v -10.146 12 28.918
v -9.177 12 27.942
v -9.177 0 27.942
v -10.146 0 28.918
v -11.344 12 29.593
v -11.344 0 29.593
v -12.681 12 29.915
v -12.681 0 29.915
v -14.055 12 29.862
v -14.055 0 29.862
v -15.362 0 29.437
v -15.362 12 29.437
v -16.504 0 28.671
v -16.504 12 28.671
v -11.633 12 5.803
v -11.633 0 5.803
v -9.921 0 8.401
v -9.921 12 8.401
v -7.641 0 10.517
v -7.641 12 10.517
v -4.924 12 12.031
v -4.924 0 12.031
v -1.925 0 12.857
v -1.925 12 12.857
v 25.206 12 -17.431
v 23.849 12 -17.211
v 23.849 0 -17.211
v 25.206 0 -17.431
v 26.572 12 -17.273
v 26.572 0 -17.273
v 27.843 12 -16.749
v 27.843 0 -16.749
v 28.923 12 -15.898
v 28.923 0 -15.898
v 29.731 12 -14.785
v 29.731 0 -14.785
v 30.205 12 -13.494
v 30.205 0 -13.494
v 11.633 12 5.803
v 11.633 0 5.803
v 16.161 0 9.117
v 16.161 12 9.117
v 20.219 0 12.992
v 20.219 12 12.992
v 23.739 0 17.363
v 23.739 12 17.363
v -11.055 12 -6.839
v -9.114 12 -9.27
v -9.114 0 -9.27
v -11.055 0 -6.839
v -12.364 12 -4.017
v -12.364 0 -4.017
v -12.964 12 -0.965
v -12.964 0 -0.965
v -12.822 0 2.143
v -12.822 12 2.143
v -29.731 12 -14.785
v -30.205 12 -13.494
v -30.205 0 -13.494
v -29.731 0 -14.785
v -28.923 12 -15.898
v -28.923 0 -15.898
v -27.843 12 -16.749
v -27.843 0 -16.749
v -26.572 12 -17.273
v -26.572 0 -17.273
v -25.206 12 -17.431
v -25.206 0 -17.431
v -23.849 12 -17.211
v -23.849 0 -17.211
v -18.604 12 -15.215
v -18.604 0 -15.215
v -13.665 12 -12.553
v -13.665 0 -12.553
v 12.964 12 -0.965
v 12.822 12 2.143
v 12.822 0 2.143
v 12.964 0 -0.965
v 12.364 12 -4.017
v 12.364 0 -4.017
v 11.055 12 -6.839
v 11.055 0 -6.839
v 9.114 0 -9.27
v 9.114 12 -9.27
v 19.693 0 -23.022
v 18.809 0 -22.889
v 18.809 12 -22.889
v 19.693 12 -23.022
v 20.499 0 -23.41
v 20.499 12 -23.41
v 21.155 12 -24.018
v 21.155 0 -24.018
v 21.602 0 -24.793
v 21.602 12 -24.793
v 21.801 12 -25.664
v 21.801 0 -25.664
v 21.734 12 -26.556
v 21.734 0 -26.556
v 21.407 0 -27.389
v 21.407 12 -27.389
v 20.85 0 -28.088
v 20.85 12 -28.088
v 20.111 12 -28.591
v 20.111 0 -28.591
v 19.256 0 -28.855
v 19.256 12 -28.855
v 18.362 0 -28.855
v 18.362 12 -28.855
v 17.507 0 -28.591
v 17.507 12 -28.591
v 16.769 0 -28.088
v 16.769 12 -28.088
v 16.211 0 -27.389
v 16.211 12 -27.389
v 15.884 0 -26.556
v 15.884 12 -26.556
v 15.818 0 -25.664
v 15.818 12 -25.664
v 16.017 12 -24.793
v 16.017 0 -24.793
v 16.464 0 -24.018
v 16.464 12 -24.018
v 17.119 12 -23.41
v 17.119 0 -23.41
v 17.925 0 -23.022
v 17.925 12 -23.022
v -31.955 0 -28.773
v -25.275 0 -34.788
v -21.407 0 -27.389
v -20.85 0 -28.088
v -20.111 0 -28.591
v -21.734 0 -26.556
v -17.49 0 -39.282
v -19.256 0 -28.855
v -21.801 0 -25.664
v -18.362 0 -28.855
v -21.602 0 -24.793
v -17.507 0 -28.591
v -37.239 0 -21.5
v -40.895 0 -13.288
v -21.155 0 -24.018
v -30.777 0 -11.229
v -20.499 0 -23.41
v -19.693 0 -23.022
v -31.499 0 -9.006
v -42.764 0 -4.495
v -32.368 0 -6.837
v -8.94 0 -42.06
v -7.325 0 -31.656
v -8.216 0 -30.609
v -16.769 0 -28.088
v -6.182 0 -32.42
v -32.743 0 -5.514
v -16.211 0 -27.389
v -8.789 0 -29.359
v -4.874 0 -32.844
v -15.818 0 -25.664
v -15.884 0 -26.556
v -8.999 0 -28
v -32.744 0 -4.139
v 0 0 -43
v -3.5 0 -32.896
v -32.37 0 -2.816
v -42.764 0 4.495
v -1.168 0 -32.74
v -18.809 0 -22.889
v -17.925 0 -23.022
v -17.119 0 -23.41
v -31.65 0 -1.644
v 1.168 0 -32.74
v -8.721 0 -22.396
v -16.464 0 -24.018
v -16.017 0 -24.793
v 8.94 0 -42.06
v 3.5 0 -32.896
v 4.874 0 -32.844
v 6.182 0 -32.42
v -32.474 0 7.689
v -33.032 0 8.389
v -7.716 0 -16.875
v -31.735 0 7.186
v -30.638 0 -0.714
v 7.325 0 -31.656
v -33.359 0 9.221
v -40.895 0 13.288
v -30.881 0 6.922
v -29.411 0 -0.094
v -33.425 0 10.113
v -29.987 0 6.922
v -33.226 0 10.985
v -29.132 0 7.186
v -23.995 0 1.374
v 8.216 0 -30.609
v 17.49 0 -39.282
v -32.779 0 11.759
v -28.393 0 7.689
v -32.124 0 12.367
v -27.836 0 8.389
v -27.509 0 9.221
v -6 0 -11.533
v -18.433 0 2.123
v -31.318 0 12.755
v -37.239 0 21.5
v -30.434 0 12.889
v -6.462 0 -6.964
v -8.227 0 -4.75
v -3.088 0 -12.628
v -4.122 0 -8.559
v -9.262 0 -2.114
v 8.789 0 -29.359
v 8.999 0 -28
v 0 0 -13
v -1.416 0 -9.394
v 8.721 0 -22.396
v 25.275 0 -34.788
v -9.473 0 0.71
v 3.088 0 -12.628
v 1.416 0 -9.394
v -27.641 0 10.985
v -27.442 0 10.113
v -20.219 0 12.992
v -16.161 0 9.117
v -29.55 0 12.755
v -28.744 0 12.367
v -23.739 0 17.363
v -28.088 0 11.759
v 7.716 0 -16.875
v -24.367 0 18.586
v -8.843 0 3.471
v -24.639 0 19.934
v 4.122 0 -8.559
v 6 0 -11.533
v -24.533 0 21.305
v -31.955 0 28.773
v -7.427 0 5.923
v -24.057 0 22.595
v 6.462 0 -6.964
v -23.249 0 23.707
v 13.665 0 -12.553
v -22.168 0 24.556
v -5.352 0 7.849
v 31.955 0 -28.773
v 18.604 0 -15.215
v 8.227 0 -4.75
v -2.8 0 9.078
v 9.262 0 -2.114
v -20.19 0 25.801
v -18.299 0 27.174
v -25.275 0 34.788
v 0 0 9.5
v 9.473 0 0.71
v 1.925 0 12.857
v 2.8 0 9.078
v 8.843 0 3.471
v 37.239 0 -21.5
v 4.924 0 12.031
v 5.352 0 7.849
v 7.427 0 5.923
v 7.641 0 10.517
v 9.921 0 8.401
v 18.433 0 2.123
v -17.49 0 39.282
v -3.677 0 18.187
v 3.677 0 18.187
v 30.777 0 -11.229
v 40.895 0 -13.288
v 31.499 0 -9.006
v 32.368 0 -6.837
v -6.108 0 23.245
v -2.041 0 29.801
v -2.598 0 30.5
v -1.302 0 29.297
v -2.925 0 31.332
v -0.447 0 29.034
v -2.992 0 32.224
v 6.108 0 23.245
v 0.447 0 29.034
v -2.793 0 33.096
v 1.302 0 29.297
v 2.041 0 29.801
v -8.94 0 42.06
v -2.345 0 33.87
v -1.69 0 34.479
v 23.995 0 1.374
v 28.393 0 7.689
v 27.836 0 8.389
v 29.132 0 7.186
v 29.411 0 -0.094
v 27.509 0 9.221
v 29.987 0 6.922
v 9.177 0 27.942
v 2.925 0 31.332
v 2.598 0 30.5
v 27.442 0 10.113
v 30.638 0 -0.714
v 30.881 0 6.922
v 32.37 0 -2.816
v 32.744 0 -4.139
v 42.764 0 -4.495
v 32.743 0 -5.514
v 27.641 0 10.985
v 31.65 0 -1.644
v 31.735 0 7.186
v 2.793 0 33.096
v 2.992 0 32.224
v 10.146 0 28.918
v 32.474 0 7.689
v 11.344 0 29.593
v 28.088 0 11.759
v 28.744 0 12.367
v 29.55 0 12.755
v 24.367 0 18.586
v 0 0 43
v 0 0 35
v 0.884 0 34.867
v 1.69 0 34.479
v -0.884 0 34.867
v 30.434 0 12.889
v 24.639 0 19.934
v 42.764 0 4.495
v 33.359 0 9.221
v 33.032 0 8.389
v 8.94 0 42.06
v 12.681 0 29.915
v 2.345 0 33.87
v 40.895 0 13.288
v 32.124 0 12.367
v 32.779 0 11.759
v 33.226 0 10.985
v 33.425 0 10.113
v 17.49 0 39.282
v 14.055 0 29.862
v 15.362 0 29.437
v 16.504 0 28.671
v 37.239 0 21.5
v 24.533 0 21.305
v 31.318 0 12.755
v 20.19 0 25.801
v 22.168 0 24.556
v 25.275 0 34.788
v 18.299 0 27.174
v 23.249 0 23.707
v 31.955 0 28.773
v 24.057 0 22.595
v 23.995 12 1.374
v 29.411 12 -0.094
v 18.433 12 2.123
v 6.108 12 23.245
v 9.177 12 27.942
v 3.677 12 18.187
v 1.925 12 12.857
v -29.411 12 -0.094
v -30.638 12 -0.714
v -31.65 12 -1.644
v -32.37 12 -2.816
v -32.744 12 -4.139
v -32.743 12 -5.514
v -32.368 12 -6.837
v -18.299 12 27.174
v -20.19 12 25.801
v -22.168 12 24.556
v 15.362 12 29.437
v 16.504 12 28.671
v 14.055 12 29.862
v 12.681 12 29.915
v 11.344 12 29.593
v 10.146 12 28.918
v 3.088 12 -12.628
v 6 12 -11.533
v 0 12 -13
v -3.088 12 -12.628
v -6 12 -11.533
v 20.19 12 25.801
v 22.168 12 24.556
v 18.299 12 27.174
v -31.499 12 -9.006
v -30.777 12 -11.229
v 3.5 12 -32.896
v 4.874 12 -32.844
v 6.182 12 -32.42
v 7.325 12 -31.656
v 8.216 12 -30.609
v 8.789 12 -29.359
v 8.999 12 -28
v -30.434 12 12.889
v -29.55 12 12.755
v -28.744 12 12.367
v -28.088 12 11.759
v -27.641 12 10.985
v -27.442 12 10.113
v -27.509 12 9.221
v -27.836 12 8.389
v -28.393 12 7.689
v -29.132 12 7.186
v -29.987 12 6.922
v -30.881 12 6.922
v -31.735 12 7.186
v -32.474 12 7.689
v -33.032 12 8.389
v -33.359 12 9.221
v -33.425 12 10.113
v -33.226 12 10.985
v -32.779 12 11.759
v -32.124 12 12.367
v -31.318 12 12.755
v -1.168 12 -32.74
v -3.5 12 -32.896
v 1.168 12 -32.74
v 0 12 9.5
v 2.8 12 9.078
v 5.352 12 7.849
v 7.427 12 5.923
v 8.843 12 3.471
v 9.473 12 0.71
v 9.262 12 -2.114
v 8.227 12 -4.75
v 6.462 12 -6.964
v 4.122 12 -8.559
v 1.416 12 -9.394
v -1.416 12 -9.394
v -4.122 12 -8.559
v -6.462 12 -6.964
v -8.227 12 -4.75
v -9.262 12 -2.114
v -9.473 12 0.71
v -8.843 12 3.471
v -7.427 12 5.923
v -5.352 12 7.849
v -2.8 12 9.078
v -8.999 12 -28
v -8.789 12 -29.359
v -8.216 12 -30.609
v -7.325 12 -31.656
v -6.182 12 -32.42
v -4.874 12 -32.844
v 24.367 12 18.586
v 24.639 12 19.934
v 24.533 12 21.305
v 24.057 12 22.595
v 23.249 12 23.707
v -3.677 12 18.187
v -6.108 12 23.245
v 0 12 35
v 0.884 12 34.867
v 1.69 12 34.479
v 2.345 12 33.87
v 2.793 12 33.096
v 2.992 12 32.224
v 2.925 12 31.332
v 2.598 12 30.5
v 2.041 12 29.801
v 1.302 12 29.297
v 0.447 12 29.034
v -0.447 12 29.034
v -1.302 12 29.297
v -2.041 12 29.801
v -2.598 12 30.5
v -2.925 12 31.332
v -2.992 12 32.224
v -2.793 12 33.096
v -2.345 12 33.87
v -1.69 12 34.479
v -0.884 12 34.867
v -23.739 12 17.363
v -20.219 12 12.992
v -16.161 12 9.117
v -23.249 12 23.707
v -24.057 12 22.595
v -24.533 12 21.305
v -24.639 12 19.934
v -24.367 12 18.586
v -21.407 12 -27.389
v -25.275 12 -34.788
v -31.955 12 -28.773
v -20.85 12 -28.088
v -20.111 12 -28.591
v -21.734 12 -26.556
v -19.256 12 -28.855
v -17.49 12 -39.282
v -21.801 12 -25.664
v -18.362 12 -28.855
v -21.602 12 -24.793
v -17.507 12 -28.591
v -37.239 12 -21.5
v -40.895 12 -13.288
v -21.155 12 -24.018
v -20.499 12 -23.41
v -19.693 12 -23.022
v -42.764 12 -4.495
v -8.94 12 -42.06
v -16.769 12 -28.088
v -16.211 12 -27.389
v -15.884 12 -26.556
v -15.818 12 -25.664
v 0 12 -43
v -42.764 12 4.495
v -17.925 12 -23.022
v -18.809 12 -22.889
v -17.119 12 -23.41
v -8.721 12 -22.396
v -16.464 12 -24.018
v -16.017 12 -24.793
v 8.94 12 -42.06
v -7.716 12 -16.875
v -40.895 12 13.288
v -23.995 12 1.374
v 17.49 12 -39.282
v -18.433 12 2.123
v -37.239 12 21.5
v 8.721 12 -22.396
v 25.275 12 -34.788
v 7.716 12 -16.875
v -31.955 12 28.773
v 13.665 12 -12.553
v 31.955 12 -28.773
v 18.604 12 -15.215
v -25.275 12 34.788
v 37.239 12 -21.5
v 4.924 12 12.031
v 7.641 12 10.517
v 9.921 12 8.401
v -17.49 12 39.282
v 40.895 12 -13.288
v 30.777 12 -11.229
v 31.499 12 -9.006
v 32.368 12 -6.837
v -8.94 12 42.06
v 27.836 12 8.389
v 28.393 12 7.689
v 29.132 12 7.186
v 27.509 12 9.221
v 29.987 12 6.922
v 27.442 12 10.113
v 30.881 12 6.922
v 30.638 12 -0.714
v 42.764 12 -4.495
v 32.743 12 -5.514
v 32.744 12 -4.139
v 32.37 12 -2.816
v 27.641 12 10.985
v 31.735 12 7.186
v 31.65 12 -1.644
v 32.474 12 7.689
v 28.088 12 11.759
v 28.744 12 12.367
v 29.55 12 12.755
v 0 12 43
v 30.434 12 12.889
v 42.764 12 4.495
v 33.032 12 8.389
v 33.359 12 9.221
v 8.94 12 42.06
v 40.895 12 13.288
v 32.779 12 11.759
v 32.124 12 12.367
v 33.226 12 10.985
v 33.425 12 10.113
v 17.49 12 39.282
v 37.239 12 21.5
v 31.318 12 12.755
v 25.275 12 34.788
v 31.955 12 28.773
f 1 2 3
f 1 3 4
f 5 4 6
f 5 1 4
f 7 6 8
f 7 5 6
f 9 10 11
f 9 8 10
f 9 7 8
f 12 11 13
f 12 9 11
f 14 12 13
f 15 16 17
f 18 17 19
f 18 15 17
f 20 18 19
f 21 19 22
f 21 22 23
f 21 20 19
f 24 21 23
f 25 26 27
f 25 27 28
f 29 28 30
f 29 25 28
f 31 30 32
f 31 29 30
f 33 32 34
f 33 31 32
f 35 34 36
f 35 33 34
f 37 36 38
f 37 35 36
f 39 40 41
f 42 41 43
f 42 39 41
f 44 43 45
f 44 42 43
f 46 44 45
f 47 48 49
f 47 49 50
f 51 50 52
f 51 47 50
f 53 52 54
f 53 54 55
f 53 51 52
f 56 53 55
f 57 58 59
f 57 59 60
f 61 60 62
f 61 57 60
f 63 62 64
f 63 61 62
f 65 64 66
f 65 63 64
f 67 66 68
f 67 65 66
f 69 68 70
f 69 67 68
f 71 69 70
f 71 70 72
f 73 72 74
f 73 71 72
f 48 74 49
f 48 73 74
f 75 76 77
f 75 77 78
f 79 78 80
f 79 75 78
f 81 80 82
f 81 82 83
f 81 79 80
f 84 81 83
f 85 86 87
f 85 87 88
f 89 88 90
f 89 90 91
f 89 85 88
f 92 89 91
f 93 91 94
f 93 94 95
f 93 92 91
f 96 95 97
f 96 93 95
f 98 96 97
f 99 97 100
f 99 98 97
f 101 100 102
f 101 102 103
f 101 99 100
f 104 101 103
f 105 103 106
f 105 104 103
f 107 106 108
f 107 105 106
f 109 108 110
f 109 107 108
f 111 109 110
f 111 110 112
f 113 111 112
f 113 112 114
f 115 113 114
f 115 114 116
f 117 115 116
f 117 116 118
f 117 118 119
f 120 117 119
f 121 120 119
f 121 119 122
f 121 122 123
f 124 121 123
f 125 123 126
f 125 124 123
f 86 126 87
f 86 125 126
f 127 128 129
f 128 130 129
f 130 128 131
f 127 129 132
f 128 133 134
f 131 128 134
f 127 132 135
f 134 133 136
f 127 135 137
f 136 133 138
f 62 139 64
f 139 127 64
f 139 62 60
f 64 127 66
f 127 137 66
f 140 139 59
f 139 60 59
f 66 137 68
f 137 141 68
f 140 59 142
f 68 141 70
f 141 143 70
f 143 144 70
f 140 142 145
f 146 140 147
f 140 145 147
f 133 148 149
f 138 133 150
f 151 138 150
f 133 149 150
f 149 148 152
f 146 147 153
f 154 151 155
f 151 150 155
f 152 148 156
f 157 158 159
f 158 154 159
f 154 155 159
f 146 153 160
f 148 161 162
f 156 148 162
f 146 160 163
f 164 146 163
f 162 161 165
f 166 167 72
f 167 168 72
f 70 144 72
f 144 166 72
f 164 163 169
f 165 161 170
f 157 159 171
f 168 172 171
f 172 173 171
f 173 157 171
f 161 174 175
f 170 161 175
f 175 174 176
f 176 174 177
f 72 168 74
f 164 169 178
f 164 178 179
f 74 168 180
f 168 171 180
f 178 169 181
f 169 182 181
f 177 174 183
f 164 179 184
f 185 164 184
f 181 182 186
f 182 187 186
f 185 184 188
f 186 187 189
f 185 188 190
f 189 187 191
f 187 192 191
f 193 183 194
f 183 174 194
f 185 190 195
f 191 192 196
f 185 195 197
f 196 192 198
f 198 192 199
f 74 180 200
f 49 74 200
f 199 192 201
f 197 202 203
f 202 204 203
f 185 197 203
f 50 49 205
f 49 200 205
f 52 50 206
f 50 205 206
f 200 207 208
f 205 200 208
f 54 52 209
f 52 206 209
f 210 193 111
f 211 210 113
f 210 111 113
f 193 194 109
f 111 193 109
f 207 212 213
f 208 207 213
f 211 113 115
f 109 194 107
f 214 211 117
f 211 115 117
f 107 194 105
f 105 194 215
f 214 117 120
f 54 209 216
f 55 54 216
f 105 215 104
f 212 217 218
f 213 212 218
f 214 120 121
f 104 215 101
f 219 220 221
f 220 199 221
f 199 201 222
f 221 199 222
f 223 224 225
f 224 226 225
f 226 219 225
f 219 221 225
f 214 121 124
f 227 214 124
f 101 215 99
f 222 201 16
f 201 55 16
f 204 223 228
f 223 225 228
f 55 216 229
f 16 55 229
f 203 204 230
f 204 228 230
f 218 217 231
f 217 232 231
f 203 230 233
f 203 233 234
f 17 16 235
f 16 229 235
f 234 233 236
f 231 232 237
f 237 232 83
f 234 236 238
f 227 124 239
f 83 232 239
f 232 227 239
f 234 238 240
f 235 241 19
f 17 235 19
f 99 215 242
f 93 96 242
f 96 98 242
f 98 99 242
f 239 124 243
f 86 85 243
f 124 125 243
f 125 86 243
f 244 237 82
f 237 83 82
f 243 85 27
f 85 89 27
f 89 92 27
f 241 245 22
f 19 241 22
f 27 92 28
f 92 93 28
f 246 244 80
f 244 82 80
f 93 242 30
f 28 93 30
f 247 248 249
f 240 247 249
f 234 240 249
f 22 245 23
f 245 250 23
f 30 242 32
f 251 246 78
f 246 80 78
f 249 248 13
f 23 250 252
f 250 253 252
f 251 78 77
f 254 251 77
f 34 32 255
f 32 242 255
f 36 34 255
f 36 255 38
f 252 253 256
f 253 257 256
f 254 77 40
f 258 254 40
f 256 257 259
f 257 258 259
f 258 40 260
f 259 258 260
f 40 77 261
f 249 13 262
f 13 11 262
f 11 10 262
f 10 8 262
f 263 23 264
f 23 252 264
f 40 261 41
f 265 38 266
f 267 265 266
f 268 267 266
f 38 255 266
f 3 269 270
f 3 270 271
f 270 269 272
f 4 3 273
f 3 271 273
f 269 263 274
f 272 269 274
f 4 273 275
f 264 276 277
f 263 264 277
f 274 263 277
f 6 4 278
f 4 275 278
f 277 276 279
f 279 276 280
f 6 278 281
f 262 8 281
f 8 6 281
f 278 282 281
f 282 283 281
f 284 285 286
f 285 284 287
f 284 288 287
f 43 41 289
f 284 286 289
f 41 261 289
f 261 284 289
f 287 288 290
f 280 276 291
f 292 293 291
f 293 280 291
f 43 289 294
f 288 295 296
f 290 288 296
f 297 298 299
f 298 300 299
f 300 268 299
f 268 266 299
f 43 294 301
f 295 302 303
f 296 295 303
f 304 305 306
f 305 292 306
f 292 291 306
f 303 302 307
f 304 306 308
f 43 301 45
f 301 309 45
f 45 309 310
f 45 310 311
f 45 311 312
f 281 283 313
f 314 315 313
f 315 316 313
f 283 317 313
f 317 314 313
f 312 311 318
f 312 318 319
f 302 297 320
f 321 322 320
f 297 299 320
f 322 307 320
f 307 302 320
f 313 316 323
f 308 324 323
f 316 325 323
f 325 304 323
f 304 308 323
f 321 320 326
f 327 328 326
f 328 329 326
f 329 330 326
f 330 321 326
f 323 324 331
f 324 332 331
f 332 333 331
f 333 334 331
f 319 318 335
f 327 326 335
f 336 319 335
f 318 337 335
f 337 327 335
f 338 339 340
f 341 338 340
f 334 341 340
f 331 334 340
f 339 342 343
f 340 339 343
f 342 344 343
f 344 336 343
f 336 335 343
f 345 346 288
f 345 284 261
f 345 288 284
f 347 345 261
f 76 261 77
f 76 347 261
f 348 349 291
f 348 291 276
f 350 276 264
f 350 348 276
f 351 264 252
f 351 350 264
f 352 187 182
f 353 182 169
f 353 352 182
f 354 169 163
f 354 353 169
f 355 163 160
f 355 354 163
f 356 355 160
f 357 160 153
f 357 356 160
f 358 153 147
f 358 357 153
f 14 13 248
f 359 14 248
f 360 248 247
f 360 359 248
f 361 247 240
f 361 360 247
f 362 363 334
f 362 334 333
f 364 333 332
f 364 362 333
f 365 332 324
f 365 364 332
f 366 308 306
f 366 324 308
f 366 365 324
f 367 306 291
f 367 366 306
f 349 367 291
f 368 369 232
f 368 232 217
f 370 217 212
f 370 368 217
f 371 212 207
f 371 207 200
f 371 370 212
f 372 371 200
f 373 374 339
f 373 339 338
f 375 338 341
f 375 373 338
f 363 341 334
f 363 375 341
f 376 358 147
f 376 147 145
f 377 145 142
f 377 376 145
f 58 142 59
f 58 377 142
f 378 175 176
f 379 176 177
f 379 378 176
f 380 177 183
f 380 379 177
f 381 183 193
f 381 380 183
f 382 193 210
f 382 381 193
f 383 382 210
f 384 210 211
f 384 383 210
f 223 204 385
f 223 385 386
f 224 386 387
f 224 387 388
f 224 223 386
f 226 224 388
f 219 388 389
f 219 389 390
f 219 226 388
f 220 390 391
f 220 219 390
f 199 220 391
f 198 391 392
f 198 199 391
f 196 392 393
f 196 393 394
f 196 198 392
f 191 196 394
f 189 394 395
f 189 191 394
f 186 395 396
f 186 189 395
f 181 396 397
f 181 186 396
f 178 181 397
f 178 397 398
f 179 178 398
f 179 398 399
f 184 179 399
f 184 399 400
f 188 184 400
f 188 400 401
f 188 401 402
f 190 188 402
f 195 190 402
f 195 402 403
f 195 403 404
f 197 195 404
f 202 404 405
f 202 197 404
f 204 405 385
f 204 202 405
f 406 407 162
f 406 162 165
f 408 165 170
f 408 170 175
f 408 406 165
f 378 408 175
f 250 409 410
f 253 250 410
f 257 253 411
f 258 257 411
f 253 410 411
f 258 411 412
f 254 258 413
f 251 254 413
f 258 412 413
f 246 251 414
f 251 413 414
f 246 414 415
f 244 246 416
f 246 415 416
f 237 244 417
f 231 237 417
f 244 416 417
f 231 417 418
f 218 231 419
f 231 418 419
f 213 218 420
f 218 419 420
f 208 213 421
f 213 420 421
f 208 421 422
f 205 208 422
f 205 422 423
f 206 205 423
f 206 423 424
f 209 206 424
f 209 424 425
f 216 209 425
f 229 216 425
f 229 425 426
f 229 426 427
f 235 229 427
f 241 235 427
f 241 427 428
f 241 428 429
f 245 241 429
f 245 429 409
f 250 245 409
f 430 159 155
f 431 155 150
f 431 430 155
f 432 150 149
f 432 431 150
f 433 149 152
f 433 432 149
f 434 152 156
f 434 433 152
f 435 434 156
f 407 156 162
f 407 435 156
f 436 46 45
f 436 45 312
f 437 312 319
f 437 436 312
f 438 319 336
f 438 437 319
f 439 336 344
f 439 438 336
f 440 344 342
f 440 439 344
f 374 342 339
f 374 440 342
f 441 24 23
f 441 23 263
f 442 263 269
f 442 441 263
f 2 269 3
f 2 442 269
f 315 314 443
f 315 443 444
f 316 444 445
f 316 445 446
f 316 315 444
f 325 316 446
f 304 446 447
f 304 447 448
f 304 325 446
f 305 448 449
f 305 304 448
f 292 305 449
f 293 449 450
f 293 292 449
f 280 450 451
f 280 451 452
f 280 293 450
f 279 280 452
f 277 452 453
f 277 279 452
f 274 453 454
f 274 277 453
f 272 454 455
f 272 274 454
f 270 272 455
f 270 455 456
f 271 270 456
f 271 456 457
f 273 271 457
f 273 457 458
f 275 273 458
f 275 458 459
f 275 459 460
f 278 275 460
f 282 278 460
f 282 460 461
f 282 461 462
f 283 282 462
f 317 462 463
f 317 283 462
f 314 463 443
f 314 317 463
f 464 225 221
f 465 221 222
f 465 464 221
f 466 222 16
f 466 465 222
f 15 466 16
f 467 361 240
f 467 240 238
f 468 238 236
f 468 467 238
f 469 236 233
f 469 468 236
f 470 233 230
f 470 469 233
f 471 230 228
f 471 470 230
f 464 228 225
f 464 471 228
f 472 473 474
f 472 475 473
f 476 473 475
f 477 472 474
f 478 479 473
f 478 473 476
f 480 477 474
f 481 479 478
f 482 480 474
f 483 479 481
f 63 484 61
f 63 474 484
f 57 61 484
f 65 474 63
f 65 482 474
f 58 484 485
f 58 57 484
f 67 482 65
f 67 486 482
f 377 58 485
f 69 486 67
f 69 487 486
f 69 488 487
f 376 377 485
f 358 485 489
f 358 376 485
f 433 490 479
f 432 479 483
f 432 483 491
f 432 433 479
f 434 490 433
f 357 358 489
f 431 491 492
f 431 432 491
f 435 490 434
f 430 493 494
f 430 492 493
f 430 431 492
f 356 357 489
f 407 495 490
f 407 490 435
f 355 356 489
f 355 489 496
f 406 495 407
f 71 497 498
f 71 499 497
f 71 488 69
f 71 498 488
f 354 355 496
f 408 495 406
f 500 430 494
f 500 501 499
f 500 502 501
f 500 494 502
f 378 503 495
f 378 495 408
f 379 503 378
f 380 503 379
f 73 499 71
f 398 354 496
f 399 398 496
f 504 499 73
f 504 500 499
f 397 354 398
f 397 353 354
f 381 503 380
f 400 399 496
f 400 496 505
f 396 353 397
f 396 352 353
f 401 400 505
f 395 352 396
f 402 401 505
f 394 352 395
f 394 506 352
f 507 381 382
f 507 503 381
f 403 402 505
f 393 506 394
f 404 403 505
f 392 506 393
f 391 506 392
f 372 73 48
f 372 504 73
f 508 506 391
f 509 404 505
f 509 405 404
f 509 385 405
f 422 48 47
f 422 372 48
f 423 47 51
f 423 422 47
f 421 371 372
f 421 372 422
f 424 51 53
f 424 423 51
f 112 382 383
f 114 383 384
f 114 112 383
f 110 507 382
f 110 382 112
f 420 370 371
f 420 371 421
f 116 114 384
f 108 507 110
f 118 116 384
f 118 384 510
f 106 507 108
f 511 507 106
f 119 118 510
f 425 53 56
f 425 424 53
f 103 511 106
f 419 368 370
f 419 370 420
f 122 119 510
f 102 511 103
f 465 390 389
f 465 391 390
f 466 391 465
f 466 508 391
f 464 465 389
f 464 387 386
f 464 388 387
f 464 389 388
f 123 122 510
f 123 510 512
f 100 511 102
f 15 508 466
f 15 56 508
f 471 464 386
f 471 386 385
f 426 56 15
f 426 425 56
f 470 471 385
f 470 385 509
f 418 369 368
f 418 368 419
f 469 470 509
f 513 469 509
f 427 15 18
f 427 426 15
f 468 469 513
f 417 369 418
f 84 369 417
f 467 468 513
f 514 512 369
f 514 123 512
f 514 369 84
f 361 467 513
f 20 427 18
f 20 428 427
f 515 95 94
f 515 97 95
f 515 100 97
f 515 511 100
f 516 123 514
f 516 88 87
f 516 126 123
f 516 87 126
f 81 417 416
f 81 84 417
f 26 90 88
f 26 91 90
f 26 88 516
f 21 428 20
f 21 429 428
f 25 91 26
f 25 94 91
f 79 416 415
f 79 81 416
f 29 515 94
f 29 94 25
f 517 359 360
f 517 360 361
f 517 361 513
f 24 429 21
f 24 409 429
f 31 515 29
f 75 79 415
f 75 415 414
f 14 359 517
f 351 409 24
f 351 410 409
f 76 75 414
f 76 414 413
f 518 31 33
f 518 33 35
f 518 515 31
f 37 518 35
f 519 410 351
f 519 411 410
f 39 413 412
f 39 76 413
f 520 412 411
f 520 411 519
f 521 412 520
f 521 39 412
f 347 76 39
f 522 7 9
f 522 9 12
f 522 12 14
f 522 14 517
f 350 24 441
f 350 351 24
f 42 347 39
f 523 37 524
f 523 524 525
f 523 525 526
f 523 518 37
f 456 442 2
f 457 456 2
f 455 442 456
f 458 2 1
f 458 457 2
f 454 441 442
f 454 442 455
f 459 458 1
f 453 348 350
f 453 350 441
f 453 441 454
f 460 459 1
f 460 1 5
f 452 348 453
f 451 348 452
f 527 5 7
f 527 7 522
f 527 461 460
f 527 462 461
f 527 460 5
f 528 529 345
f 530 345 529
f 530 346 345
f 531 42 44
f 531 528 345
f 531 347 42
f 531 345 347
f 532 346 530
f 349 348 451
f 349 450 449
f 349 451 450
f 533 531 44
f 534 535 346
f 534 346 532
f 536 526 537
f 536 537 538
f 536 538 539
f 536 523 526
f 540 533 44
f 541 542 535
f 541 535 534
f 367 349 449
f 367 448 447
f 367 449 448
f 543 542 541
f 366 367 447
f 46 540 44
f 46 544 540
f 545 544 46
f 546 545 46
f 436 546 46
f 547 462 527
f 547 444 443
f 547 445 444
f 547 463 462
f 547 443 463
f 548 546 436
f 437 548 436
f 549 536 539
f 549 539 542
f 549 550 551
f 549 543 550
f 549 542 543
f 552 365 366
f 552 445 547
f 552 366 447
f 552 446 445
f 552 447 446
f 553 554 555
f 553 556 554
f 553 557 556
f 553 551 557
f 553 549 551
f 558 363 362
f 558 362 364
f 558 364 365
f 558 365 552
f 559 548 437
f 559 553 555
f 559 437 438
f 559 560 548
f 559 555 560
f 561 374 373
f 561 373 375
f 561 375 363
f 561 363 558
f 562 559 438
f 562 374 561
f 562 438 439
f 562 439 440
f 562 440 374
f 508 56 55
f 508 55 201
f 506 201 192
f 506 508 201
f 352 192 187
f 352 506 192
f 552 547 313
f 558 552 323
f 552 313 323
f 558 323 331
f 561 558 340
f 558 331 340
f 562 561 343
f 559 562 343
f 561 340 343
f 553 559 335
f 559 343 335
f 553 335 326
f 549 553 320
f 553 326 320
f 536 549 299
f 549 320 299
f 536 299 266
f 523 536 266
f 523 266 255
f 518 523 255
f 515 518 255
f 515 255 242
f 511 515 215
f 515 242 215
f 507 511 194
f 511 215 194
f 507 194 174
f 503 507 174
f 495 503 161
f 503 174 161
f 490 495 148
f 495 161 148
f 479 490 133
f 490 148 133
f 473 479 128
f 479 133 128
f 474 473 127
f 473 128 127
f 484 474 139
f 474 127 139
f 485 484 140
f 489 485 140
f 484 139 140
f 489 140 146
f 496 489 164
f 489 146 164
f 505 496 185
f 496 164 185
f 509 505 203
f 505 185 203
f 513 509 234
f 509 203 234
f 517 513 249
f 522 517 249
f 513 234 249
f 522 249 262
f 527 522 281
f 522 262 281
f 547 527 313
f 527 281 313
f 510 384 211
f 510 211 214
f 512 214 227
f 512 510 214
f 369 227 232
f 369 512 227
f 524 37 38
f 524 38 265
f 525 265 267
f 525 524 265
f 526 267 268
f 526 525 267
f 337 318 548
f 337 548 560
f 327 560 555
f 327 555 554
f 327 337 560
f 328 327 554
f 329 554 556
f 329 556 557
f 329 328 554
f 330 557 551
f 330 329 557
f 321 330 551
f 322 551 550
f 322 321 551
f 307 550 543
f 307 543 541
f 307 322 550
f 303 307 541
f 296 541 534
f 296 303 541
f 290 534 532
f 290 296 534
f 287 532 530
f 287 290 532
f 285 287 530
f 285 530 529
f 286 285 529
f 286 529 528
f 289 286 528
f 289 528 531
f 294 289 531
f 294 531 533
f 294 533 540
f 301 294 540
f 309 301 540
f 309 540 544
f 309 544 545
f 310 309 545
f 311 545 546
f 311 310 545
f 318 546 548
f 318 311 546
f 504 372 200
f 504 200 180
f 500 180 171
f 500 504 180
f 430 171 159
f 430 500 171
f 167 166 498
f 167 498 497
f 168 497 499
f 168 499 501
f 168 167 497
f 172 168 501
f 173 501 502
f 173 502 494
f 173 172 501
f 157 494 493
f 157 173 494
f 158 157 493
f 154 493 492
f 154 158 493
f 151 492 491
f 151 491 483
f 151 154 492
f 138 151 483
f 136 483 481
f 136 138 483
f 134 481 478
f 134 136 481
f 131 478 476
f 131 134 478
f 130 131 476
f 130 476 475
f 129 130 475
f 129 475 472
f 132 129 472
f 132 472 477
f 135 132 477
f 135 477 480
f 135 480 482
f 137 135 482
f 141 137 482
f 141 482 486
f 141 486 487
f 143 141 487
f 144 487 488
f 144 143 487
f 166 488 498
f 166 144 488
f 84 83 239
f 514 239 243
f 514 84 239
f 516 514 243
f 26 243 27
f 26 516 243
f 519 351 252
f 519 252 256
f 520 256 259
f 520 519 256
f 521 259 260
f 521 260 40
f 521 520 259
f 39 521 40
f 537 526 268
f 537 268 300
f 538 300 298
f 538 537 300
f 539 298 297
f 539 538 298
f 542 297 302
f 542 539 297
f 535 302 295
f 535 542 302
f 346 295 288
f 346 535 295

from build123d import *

# Parameters (mm, degrees)
SKETCH_1_R          = 43
SKETCH_1_R_2        = 3
EXTRUDE_1_DEPTH     = 12
SKETCH_2_R          = 9.5
CUT_EXTRUDE_1_DEPTH = 62.983868869


with BuildPart() as part:
    # 草图1 → 凸台-拉伸1 (new body)
    with BuildSketch(Plane(origin=(0, 0, 0), x_dir=(1, 0, 0), z_dir=(0, 1, 0))):
        with Locations(Location((0, 0, 0), (0, 0, 270))):
            Circle(SKETCH_1_R)
        with Locations(Location((0, -32, 0), (0, 0, 270))):
            Circle(SKETCH_1_R_2, mode=Mode.SUBTRACT)
        with Locations(Location((-30.433808521, -9.88854382, 0), (0, 0, 270))):
            Circle(SKETCH_1_R_2, mode=Mode.SUBTRACT)
        with Locations(Location((-18.809128073, 25.88854382, 0), (0, 0, 270))):
            Circle(SKETCH_1_R_2, mode=Mode.SUBTRACT)
        with Locations(Location((18.809128073, 25.88854382, 0), (0, 0, 270))):
            Circle(SKETCH_1_R_2, mode=Mode.SUBTRACT)
        with Locations(Location((30.433808521, -9.88854382, 0), (0, 0, 270))):
            Circle(SKETCH_1_R_2, mode=Mode.SUBTRACT)
    extrude(amount=EXTRUDE_1_DEPTH)

    # 草图2 → 切除-拉伸1 (cut, through all)
    with BuildSketch(Plane(origin=(0, 12, 0), x_dir=(1, 0, 0), z_dir=(0, 1, 0))):
        with Locations(Location((0, 0, 0), (0, 0, 270))):
            Circle(SKETCH_2_R)
        with BuildLine():
            ThreePointArc((6, 11.532562595), (0, 13), (-6, 11.532562595))
            ThreePointArc((-6, 11.532562595), (-8.308699922, 19.618928286), (-8.999382438, 28))
            ThreePointArc((-8.999382438, 28), (-7.324858249, 31.655760291), (-3.5, 32.896354479))
            ThreePointArc((-3.5, 32.896354479), (0, 32.720914778), (3.5, 32.896354479))
            ThreePointArc((3.5, 32.896354479), (7.324858249, 31.655760291), (8.999382438, 28))
            ThreePointArc((8.999382438, 28), (8.308699922, 19.618928286), (6, 11.532562595))
        make_face()
        with BuildLine():
            ThreePointArc((12.822220771, -2.142581267), (12.363734712, 4.017220927), (9.114016839, 9.270096928))
            ThreePointArc((9.114016839, 9.270096928), (16.091180112, 13.964625454), (23.848620344, 17.211397152))
            ThreePointArc((23.848620344, 17.211397152), (27.842911423, 16.748522069), (30.204732809, 13.494230394))
            ThreePointArc((30.204732809, 13.494230394), (31.119439219, 10.111318738), (32.36785177, 6.83683478))
            ThreePointArc((32.36785177, 6.83683478), (32.369922784, 2.815813731), (29.410544568, 0.093554533))
            ThreePointArc((29.410544568, 0.093554533), (21.226239066, -1.839460951), (12.822220771, -2.142581267))
        make_face()
        with BuildLine():
            ThreePointArc((1.924568248, -12.856750642), (7.64120828, -10.517220927), (11.632772181, -5.803327614))
            ThreePointArc((11.632772181, -5.803327614), (18.25359615, -10.988315115), (23.738640395, -17.362771566))
            ThreePointArc((23.738640395, -17.362771566), (24.532723854, -21.304604391), (22.167551497, -24.556461444))
            ThreePointArc((22.167551497, -24.556461444), (19.232871148, -26.471776127), (16.504432537, -28.67095821))
            ThreePointArc((16.504432537, -28.67095821), (12.680854244, -29.915491699), (9.177333733, -27.942180119))
            ThreePointArc((9.177333733, -27.942180119), (4.809837274, -20.755777674), (1.924568248, -12.856750642))
        make_face()
        with BuildLine():
            ThreePointArc((-11.632772181, -5.803327614), (-7.64120828, -10.517220927), (-1.924568248, -12.856750642))
            ThreePointArc((-1.924568248, -12.856750642), (-4.809837274, -20.755777674), (-9.177333733, -27.942180119))
            ThreePointArc((-9.177333733, -27.942180119), (-12.680854244, -29.915491699), (-16.504432537, -28.67095821))
            ThreePointArc((-16.504432537, -28.67095821), (-19.232871148, -26.471776127), (-22.167551497, -24.556461444))
            ThreePointArc((-22.167551497, -24.556461444), (-24.532723854, -21.304604391), (-23.738640395, -17.362771566))
            ThreePointArc((-23.738640395, -17.362771566), (-18.25359615, -10.988315115), (-11.632772181, -5.803327614))
        make_face()
        with BuildLine():
            ThreePointArc((-9.114016839, 9.270096928), (-12.363734712, 4.017220927), (-12.822220771, -2.142581267))
            ThreePointArc((-12.822220771, -2.142581267), (-21.226239066, -1.839460951), (-29.410544568, 0.093554533))
            ThreePointArc((-29.410544568, 0.093554533), (-32.369922784, 2.815813731), (-32.36785177, 6.83683478))
            ThreePointArc((-32.36785177, 6.83683478), (-31.119439219, 10.111318738), (-30.204732809, 13.494230394))
            ThreePointArc((-30.204732809, 13.494230394), (-27.842911423, 16.748522069), (-23.848620344, 17.211397152))
            ThreePointArc((-23.848620344, 17.211397152), (-16.091180112, 13.964625454), (-9.114016839, 9.270096928))
        make_face()
    extrude(amount=-CUT_EXTRUDE_1_DEPTH, mode=Mode.SUBTRACT)


solid = part.part
